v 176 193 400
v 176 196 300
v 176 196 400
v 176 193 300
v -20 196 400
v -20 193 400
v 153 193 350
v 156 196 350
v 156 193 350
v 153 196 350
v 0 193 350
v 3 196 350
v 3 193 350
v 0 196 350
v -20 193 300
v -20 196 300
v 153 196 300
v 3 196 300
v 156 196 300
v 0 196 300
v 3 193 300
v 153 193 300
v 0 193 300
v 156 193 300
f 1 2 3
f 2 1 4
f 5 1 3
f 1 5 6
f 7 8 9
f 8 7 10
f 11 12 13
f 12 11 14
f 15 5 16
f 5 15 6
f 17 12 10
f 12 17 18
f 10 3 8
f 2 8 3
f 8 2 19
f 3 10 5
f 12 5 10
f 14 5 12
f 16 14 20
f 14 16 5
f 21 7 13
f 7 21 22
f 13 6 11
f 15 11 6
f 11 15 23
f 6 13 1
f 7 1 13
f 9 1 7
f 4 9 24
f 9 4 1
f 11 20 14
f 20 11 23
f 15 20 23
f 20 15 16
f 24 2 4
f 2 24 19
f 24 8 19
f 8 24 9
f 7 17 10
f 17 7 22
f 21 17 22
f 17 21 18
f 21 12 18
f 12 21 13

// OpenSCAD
module part08(){
    translate([-20,193,350])color("green")cube([196,3,50]);
    translate([-20,193,300])color("green")cube([20,3,50]);
    translate([156,193,300])color("green")cube([20,3,50]);
    translate([3,193,300])color("green")cube([150,3,50]);

}


//use <part01.scad>;
//use <part02.scad>;
//use <part03.scad>;
//use <part04.scad>;
//use <part05.scad>;
//use <part06.scad>;
//use <part07.scad>;
//
//part01();
//part02();
//part03();
//// zweites Seitenteil
//translate([15.3,0,0]) part03();
//part04();
//part05();
//part06();
//part07();
part08();
//
//projection (cut=false)
//translate([0,0,0])rotate([-90,0,0]) part08();
